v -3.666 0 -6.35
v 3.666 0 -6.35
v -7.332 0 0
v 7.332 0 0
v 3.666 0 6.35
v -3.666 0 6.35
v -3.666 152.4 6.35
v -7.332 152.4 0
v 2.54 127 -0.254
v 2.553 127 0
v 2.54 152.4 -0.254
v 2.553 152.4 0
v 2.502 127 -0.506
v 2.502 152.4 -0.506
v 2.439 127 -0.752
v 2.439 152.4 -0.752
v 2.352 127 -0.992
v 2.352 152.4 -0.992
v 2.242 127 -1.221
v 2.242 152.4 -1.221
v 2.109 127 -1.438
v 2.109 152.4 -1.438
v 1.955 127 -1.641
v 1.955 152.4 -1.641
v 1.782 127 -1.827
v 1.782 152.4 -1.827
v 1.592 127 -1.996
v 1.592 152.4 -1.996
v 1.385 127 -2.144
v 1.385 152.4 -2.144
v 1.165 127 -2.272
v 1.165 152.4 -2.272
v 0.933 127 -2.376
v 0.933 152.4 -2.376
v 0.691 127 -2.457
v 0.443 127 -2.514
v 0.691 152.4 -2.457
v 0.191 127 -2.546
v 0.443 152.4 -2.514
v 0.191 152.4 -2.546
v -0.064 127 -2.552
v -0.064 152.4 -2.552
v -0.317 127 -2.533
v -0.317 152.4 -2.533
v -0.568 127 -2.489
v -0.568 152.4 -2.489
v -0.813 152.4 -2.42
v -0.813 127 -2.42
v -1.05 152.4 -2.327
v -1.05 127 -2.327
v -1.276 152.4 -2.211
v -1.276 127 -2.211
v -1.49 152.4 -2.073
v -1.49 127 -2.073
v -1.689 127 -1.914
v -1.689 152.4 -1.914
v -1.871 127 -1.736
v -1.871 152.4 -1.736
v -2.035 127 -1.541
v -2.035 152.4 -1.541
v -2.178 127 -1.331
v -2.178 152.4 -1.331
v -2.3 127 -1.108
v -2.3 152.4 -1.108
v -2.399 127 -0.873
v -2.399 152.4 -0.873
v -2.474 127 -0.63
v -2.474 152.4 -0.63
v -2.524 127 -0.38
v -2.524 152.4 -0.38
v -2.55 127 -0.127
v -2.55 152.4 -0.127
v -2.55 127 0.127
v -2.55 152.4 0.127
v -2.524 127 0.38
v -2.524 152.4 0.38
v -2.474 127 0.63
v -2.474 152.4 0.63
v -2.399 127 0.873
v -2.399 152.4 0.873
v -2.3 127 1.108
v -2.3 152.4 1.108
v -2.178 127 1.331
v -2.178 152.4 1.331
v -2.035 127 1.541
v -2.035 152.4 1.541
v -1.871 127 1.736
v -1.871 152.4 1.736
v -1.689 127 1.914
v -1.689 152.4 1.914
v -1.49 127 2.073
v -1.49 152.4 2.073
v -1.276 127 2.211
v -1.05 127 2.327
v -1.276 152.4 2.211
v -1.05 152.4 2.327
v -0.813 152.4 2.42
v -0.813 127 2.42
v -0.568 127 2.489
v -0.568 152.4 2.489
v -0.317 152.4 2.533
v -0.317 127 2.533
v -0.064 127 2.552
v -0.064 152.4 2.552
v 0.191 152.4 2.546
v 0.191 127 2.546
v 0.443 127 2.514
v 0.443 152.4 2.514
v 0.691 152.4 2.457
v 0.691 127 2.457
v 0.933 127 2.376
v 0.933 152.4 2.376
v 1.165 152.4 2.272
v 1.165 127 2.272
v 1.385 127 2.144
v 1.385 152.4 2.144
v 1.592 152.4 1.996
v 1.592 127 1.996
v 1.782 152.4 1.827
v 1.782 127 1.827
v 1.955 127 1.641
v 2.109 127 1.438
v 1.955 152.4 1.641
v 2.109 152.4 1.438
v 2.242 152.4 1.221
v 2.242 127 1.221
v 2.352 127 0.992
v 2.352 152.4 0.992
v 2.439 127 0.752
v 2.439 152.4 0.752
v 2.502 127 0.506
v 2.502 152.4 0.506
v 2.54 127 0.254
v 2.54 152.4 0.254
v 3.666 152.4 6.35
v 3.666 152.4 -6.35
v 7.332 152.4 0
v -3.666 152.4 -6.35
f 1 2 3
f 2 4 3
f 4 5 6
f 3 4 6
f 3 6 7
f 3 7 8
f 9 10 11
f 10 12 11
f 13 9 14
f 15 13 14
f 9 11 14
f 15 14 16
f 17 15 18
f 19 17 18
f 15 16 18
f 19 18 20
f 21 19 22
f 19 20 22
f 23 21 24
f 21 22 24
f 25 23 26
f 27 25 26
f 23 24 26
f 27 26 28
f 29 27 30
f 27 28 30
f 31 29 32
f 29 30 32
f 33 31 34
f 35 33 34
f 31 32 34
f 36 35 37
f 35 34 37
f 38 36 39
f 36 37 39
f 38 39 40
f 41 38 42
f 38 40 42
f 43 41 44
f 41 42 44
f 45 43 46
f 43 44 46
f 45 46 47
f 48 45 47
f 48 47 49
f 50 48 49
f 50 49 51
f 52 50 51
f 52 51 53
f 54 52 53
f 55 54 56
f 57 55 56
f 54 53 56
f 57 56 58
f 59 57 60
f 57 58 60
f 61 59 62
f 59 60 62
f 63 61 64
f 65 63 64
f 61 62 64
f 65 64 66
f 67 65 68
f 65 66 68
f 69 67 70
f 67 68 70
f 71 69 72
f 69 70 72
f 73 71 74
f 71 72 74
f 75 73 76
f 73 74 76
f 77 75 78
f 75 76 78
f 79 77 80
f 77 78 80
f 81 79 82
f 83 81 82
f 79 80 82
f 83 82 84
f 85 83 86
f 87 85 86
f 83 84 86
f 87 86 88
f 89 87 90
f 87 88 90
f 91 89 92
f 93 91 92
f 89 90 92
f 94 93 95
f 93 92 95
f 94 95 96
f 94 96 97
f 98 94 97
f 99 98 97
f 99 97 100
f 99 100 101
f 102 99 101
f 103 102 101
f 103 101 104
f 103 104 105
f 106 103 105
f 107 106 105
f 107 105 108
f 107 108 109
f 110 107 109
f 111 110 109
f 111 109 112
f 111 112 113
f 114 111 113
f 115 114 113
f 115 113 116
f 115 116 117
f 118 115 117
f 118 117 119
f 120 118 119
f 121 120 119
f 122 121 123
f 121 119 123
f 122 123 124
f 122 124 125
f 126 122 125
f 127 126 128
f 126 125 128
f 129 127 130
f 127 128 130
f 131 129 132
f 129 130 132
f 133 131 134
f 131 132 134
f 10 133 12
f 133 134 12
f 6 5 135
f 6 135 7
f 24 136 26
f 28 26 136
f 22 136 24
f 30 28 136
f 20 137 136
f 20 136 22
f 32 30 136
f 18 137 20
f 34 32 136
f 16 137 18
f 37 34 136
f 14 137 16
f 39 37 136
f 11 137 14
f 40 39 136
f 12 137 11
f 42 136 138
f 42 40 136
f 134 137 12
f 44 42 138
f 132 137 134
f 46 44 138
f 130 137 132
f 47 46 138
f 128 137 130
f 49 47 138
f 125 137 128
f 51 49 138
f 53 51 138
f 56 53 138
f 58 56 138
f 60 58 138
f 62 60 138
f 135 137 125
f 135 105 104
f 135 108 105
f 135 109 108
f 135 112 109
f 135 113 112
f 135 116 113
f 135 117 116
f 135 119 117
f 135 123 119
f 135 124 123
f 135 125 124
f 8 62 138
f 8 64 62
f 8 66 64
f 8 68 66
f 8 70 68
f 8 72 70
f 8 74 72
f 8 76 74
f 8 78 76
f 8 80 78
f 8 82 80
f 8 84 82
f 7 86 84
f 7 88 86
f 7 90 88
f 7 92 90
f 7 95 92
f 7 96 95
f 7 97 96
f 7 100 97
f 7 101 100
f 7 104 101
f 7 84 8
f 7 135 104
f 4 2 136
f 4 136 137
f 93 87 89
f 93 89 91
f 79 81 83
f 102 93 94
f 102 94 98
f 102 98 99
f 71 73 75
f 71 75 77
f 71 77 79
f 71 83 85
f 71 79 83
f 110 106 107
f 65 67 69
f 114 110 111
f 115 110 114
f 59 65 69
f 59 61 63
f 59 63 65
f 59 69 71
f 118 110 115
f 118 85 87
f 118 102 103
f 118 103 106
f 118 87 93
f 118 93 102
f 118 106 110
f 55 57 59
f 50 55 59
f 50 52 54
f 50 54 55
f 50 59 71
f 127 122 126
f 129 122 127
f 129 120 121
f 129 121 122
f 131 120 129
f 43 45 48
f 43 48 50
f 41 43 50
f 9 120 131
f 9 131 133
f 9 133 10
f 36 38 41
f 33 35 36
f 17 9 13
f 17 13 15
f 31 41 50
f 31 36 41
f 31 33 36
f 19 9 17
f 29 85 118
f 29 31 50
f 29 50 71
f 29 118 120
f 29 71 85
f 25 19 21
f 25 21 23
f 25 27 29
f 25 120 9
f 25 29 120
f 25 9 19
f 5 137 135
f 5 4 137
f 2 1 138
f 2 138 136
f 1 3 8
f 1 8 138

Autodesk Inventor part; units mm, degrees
ref_plane "YZ Plane" through (0, 0, 0) normal (1, 0, 0) x (0, 1, 0)
ref_plane "XZ Plane" through (0, 0, 0) normal (0, 1, 0) x (-1, 0, 0)
ref_plane "XY Plane" through (0, 0, 0) normal (0, 0, 1) x (1, 0, 0)
sketch "Sketch1" plane through (0, 0, 0) normal (0, 1, 0) x (-1, 0, 0)
  line L0 (-7.3323, 0) -> (-3.6662, 6.35)
  line L1 (-3.6662, 6.35) -> (3.6662, 6.35)
  line L2 (3.6662, 6.35) -> (7.3323, 0)
  line L3 (7.3323, 0) -> (3.6662, -6.35)
  line L4 (3.6662, -6.35) -> (-3.6662, -6.35)
  line L5 (-3.6662, -6.35) -> (-7.3323, 0)
  point P0 (0, 0)
  point P1 (0, 0)
  point P2 (-5.4993, 3.175)
  dimension "d0" = 12.7
extrude "Extrusion1" add sketch "Sketch1" along normal blind 152.4
sketch "Sketch2" plane through (0, 152.4, 0) normal (0, 1, 0) x (1, 0, 0)
  circle A0 centre (0, 0) radius 2.5527
  dimension "d3" = 5.1054
extrude "Extrusion2" cut sketch "Sketch2" against normal blind 25.4
properties part number "INDEX_009_6inHex" material "Aluminum 6061"
